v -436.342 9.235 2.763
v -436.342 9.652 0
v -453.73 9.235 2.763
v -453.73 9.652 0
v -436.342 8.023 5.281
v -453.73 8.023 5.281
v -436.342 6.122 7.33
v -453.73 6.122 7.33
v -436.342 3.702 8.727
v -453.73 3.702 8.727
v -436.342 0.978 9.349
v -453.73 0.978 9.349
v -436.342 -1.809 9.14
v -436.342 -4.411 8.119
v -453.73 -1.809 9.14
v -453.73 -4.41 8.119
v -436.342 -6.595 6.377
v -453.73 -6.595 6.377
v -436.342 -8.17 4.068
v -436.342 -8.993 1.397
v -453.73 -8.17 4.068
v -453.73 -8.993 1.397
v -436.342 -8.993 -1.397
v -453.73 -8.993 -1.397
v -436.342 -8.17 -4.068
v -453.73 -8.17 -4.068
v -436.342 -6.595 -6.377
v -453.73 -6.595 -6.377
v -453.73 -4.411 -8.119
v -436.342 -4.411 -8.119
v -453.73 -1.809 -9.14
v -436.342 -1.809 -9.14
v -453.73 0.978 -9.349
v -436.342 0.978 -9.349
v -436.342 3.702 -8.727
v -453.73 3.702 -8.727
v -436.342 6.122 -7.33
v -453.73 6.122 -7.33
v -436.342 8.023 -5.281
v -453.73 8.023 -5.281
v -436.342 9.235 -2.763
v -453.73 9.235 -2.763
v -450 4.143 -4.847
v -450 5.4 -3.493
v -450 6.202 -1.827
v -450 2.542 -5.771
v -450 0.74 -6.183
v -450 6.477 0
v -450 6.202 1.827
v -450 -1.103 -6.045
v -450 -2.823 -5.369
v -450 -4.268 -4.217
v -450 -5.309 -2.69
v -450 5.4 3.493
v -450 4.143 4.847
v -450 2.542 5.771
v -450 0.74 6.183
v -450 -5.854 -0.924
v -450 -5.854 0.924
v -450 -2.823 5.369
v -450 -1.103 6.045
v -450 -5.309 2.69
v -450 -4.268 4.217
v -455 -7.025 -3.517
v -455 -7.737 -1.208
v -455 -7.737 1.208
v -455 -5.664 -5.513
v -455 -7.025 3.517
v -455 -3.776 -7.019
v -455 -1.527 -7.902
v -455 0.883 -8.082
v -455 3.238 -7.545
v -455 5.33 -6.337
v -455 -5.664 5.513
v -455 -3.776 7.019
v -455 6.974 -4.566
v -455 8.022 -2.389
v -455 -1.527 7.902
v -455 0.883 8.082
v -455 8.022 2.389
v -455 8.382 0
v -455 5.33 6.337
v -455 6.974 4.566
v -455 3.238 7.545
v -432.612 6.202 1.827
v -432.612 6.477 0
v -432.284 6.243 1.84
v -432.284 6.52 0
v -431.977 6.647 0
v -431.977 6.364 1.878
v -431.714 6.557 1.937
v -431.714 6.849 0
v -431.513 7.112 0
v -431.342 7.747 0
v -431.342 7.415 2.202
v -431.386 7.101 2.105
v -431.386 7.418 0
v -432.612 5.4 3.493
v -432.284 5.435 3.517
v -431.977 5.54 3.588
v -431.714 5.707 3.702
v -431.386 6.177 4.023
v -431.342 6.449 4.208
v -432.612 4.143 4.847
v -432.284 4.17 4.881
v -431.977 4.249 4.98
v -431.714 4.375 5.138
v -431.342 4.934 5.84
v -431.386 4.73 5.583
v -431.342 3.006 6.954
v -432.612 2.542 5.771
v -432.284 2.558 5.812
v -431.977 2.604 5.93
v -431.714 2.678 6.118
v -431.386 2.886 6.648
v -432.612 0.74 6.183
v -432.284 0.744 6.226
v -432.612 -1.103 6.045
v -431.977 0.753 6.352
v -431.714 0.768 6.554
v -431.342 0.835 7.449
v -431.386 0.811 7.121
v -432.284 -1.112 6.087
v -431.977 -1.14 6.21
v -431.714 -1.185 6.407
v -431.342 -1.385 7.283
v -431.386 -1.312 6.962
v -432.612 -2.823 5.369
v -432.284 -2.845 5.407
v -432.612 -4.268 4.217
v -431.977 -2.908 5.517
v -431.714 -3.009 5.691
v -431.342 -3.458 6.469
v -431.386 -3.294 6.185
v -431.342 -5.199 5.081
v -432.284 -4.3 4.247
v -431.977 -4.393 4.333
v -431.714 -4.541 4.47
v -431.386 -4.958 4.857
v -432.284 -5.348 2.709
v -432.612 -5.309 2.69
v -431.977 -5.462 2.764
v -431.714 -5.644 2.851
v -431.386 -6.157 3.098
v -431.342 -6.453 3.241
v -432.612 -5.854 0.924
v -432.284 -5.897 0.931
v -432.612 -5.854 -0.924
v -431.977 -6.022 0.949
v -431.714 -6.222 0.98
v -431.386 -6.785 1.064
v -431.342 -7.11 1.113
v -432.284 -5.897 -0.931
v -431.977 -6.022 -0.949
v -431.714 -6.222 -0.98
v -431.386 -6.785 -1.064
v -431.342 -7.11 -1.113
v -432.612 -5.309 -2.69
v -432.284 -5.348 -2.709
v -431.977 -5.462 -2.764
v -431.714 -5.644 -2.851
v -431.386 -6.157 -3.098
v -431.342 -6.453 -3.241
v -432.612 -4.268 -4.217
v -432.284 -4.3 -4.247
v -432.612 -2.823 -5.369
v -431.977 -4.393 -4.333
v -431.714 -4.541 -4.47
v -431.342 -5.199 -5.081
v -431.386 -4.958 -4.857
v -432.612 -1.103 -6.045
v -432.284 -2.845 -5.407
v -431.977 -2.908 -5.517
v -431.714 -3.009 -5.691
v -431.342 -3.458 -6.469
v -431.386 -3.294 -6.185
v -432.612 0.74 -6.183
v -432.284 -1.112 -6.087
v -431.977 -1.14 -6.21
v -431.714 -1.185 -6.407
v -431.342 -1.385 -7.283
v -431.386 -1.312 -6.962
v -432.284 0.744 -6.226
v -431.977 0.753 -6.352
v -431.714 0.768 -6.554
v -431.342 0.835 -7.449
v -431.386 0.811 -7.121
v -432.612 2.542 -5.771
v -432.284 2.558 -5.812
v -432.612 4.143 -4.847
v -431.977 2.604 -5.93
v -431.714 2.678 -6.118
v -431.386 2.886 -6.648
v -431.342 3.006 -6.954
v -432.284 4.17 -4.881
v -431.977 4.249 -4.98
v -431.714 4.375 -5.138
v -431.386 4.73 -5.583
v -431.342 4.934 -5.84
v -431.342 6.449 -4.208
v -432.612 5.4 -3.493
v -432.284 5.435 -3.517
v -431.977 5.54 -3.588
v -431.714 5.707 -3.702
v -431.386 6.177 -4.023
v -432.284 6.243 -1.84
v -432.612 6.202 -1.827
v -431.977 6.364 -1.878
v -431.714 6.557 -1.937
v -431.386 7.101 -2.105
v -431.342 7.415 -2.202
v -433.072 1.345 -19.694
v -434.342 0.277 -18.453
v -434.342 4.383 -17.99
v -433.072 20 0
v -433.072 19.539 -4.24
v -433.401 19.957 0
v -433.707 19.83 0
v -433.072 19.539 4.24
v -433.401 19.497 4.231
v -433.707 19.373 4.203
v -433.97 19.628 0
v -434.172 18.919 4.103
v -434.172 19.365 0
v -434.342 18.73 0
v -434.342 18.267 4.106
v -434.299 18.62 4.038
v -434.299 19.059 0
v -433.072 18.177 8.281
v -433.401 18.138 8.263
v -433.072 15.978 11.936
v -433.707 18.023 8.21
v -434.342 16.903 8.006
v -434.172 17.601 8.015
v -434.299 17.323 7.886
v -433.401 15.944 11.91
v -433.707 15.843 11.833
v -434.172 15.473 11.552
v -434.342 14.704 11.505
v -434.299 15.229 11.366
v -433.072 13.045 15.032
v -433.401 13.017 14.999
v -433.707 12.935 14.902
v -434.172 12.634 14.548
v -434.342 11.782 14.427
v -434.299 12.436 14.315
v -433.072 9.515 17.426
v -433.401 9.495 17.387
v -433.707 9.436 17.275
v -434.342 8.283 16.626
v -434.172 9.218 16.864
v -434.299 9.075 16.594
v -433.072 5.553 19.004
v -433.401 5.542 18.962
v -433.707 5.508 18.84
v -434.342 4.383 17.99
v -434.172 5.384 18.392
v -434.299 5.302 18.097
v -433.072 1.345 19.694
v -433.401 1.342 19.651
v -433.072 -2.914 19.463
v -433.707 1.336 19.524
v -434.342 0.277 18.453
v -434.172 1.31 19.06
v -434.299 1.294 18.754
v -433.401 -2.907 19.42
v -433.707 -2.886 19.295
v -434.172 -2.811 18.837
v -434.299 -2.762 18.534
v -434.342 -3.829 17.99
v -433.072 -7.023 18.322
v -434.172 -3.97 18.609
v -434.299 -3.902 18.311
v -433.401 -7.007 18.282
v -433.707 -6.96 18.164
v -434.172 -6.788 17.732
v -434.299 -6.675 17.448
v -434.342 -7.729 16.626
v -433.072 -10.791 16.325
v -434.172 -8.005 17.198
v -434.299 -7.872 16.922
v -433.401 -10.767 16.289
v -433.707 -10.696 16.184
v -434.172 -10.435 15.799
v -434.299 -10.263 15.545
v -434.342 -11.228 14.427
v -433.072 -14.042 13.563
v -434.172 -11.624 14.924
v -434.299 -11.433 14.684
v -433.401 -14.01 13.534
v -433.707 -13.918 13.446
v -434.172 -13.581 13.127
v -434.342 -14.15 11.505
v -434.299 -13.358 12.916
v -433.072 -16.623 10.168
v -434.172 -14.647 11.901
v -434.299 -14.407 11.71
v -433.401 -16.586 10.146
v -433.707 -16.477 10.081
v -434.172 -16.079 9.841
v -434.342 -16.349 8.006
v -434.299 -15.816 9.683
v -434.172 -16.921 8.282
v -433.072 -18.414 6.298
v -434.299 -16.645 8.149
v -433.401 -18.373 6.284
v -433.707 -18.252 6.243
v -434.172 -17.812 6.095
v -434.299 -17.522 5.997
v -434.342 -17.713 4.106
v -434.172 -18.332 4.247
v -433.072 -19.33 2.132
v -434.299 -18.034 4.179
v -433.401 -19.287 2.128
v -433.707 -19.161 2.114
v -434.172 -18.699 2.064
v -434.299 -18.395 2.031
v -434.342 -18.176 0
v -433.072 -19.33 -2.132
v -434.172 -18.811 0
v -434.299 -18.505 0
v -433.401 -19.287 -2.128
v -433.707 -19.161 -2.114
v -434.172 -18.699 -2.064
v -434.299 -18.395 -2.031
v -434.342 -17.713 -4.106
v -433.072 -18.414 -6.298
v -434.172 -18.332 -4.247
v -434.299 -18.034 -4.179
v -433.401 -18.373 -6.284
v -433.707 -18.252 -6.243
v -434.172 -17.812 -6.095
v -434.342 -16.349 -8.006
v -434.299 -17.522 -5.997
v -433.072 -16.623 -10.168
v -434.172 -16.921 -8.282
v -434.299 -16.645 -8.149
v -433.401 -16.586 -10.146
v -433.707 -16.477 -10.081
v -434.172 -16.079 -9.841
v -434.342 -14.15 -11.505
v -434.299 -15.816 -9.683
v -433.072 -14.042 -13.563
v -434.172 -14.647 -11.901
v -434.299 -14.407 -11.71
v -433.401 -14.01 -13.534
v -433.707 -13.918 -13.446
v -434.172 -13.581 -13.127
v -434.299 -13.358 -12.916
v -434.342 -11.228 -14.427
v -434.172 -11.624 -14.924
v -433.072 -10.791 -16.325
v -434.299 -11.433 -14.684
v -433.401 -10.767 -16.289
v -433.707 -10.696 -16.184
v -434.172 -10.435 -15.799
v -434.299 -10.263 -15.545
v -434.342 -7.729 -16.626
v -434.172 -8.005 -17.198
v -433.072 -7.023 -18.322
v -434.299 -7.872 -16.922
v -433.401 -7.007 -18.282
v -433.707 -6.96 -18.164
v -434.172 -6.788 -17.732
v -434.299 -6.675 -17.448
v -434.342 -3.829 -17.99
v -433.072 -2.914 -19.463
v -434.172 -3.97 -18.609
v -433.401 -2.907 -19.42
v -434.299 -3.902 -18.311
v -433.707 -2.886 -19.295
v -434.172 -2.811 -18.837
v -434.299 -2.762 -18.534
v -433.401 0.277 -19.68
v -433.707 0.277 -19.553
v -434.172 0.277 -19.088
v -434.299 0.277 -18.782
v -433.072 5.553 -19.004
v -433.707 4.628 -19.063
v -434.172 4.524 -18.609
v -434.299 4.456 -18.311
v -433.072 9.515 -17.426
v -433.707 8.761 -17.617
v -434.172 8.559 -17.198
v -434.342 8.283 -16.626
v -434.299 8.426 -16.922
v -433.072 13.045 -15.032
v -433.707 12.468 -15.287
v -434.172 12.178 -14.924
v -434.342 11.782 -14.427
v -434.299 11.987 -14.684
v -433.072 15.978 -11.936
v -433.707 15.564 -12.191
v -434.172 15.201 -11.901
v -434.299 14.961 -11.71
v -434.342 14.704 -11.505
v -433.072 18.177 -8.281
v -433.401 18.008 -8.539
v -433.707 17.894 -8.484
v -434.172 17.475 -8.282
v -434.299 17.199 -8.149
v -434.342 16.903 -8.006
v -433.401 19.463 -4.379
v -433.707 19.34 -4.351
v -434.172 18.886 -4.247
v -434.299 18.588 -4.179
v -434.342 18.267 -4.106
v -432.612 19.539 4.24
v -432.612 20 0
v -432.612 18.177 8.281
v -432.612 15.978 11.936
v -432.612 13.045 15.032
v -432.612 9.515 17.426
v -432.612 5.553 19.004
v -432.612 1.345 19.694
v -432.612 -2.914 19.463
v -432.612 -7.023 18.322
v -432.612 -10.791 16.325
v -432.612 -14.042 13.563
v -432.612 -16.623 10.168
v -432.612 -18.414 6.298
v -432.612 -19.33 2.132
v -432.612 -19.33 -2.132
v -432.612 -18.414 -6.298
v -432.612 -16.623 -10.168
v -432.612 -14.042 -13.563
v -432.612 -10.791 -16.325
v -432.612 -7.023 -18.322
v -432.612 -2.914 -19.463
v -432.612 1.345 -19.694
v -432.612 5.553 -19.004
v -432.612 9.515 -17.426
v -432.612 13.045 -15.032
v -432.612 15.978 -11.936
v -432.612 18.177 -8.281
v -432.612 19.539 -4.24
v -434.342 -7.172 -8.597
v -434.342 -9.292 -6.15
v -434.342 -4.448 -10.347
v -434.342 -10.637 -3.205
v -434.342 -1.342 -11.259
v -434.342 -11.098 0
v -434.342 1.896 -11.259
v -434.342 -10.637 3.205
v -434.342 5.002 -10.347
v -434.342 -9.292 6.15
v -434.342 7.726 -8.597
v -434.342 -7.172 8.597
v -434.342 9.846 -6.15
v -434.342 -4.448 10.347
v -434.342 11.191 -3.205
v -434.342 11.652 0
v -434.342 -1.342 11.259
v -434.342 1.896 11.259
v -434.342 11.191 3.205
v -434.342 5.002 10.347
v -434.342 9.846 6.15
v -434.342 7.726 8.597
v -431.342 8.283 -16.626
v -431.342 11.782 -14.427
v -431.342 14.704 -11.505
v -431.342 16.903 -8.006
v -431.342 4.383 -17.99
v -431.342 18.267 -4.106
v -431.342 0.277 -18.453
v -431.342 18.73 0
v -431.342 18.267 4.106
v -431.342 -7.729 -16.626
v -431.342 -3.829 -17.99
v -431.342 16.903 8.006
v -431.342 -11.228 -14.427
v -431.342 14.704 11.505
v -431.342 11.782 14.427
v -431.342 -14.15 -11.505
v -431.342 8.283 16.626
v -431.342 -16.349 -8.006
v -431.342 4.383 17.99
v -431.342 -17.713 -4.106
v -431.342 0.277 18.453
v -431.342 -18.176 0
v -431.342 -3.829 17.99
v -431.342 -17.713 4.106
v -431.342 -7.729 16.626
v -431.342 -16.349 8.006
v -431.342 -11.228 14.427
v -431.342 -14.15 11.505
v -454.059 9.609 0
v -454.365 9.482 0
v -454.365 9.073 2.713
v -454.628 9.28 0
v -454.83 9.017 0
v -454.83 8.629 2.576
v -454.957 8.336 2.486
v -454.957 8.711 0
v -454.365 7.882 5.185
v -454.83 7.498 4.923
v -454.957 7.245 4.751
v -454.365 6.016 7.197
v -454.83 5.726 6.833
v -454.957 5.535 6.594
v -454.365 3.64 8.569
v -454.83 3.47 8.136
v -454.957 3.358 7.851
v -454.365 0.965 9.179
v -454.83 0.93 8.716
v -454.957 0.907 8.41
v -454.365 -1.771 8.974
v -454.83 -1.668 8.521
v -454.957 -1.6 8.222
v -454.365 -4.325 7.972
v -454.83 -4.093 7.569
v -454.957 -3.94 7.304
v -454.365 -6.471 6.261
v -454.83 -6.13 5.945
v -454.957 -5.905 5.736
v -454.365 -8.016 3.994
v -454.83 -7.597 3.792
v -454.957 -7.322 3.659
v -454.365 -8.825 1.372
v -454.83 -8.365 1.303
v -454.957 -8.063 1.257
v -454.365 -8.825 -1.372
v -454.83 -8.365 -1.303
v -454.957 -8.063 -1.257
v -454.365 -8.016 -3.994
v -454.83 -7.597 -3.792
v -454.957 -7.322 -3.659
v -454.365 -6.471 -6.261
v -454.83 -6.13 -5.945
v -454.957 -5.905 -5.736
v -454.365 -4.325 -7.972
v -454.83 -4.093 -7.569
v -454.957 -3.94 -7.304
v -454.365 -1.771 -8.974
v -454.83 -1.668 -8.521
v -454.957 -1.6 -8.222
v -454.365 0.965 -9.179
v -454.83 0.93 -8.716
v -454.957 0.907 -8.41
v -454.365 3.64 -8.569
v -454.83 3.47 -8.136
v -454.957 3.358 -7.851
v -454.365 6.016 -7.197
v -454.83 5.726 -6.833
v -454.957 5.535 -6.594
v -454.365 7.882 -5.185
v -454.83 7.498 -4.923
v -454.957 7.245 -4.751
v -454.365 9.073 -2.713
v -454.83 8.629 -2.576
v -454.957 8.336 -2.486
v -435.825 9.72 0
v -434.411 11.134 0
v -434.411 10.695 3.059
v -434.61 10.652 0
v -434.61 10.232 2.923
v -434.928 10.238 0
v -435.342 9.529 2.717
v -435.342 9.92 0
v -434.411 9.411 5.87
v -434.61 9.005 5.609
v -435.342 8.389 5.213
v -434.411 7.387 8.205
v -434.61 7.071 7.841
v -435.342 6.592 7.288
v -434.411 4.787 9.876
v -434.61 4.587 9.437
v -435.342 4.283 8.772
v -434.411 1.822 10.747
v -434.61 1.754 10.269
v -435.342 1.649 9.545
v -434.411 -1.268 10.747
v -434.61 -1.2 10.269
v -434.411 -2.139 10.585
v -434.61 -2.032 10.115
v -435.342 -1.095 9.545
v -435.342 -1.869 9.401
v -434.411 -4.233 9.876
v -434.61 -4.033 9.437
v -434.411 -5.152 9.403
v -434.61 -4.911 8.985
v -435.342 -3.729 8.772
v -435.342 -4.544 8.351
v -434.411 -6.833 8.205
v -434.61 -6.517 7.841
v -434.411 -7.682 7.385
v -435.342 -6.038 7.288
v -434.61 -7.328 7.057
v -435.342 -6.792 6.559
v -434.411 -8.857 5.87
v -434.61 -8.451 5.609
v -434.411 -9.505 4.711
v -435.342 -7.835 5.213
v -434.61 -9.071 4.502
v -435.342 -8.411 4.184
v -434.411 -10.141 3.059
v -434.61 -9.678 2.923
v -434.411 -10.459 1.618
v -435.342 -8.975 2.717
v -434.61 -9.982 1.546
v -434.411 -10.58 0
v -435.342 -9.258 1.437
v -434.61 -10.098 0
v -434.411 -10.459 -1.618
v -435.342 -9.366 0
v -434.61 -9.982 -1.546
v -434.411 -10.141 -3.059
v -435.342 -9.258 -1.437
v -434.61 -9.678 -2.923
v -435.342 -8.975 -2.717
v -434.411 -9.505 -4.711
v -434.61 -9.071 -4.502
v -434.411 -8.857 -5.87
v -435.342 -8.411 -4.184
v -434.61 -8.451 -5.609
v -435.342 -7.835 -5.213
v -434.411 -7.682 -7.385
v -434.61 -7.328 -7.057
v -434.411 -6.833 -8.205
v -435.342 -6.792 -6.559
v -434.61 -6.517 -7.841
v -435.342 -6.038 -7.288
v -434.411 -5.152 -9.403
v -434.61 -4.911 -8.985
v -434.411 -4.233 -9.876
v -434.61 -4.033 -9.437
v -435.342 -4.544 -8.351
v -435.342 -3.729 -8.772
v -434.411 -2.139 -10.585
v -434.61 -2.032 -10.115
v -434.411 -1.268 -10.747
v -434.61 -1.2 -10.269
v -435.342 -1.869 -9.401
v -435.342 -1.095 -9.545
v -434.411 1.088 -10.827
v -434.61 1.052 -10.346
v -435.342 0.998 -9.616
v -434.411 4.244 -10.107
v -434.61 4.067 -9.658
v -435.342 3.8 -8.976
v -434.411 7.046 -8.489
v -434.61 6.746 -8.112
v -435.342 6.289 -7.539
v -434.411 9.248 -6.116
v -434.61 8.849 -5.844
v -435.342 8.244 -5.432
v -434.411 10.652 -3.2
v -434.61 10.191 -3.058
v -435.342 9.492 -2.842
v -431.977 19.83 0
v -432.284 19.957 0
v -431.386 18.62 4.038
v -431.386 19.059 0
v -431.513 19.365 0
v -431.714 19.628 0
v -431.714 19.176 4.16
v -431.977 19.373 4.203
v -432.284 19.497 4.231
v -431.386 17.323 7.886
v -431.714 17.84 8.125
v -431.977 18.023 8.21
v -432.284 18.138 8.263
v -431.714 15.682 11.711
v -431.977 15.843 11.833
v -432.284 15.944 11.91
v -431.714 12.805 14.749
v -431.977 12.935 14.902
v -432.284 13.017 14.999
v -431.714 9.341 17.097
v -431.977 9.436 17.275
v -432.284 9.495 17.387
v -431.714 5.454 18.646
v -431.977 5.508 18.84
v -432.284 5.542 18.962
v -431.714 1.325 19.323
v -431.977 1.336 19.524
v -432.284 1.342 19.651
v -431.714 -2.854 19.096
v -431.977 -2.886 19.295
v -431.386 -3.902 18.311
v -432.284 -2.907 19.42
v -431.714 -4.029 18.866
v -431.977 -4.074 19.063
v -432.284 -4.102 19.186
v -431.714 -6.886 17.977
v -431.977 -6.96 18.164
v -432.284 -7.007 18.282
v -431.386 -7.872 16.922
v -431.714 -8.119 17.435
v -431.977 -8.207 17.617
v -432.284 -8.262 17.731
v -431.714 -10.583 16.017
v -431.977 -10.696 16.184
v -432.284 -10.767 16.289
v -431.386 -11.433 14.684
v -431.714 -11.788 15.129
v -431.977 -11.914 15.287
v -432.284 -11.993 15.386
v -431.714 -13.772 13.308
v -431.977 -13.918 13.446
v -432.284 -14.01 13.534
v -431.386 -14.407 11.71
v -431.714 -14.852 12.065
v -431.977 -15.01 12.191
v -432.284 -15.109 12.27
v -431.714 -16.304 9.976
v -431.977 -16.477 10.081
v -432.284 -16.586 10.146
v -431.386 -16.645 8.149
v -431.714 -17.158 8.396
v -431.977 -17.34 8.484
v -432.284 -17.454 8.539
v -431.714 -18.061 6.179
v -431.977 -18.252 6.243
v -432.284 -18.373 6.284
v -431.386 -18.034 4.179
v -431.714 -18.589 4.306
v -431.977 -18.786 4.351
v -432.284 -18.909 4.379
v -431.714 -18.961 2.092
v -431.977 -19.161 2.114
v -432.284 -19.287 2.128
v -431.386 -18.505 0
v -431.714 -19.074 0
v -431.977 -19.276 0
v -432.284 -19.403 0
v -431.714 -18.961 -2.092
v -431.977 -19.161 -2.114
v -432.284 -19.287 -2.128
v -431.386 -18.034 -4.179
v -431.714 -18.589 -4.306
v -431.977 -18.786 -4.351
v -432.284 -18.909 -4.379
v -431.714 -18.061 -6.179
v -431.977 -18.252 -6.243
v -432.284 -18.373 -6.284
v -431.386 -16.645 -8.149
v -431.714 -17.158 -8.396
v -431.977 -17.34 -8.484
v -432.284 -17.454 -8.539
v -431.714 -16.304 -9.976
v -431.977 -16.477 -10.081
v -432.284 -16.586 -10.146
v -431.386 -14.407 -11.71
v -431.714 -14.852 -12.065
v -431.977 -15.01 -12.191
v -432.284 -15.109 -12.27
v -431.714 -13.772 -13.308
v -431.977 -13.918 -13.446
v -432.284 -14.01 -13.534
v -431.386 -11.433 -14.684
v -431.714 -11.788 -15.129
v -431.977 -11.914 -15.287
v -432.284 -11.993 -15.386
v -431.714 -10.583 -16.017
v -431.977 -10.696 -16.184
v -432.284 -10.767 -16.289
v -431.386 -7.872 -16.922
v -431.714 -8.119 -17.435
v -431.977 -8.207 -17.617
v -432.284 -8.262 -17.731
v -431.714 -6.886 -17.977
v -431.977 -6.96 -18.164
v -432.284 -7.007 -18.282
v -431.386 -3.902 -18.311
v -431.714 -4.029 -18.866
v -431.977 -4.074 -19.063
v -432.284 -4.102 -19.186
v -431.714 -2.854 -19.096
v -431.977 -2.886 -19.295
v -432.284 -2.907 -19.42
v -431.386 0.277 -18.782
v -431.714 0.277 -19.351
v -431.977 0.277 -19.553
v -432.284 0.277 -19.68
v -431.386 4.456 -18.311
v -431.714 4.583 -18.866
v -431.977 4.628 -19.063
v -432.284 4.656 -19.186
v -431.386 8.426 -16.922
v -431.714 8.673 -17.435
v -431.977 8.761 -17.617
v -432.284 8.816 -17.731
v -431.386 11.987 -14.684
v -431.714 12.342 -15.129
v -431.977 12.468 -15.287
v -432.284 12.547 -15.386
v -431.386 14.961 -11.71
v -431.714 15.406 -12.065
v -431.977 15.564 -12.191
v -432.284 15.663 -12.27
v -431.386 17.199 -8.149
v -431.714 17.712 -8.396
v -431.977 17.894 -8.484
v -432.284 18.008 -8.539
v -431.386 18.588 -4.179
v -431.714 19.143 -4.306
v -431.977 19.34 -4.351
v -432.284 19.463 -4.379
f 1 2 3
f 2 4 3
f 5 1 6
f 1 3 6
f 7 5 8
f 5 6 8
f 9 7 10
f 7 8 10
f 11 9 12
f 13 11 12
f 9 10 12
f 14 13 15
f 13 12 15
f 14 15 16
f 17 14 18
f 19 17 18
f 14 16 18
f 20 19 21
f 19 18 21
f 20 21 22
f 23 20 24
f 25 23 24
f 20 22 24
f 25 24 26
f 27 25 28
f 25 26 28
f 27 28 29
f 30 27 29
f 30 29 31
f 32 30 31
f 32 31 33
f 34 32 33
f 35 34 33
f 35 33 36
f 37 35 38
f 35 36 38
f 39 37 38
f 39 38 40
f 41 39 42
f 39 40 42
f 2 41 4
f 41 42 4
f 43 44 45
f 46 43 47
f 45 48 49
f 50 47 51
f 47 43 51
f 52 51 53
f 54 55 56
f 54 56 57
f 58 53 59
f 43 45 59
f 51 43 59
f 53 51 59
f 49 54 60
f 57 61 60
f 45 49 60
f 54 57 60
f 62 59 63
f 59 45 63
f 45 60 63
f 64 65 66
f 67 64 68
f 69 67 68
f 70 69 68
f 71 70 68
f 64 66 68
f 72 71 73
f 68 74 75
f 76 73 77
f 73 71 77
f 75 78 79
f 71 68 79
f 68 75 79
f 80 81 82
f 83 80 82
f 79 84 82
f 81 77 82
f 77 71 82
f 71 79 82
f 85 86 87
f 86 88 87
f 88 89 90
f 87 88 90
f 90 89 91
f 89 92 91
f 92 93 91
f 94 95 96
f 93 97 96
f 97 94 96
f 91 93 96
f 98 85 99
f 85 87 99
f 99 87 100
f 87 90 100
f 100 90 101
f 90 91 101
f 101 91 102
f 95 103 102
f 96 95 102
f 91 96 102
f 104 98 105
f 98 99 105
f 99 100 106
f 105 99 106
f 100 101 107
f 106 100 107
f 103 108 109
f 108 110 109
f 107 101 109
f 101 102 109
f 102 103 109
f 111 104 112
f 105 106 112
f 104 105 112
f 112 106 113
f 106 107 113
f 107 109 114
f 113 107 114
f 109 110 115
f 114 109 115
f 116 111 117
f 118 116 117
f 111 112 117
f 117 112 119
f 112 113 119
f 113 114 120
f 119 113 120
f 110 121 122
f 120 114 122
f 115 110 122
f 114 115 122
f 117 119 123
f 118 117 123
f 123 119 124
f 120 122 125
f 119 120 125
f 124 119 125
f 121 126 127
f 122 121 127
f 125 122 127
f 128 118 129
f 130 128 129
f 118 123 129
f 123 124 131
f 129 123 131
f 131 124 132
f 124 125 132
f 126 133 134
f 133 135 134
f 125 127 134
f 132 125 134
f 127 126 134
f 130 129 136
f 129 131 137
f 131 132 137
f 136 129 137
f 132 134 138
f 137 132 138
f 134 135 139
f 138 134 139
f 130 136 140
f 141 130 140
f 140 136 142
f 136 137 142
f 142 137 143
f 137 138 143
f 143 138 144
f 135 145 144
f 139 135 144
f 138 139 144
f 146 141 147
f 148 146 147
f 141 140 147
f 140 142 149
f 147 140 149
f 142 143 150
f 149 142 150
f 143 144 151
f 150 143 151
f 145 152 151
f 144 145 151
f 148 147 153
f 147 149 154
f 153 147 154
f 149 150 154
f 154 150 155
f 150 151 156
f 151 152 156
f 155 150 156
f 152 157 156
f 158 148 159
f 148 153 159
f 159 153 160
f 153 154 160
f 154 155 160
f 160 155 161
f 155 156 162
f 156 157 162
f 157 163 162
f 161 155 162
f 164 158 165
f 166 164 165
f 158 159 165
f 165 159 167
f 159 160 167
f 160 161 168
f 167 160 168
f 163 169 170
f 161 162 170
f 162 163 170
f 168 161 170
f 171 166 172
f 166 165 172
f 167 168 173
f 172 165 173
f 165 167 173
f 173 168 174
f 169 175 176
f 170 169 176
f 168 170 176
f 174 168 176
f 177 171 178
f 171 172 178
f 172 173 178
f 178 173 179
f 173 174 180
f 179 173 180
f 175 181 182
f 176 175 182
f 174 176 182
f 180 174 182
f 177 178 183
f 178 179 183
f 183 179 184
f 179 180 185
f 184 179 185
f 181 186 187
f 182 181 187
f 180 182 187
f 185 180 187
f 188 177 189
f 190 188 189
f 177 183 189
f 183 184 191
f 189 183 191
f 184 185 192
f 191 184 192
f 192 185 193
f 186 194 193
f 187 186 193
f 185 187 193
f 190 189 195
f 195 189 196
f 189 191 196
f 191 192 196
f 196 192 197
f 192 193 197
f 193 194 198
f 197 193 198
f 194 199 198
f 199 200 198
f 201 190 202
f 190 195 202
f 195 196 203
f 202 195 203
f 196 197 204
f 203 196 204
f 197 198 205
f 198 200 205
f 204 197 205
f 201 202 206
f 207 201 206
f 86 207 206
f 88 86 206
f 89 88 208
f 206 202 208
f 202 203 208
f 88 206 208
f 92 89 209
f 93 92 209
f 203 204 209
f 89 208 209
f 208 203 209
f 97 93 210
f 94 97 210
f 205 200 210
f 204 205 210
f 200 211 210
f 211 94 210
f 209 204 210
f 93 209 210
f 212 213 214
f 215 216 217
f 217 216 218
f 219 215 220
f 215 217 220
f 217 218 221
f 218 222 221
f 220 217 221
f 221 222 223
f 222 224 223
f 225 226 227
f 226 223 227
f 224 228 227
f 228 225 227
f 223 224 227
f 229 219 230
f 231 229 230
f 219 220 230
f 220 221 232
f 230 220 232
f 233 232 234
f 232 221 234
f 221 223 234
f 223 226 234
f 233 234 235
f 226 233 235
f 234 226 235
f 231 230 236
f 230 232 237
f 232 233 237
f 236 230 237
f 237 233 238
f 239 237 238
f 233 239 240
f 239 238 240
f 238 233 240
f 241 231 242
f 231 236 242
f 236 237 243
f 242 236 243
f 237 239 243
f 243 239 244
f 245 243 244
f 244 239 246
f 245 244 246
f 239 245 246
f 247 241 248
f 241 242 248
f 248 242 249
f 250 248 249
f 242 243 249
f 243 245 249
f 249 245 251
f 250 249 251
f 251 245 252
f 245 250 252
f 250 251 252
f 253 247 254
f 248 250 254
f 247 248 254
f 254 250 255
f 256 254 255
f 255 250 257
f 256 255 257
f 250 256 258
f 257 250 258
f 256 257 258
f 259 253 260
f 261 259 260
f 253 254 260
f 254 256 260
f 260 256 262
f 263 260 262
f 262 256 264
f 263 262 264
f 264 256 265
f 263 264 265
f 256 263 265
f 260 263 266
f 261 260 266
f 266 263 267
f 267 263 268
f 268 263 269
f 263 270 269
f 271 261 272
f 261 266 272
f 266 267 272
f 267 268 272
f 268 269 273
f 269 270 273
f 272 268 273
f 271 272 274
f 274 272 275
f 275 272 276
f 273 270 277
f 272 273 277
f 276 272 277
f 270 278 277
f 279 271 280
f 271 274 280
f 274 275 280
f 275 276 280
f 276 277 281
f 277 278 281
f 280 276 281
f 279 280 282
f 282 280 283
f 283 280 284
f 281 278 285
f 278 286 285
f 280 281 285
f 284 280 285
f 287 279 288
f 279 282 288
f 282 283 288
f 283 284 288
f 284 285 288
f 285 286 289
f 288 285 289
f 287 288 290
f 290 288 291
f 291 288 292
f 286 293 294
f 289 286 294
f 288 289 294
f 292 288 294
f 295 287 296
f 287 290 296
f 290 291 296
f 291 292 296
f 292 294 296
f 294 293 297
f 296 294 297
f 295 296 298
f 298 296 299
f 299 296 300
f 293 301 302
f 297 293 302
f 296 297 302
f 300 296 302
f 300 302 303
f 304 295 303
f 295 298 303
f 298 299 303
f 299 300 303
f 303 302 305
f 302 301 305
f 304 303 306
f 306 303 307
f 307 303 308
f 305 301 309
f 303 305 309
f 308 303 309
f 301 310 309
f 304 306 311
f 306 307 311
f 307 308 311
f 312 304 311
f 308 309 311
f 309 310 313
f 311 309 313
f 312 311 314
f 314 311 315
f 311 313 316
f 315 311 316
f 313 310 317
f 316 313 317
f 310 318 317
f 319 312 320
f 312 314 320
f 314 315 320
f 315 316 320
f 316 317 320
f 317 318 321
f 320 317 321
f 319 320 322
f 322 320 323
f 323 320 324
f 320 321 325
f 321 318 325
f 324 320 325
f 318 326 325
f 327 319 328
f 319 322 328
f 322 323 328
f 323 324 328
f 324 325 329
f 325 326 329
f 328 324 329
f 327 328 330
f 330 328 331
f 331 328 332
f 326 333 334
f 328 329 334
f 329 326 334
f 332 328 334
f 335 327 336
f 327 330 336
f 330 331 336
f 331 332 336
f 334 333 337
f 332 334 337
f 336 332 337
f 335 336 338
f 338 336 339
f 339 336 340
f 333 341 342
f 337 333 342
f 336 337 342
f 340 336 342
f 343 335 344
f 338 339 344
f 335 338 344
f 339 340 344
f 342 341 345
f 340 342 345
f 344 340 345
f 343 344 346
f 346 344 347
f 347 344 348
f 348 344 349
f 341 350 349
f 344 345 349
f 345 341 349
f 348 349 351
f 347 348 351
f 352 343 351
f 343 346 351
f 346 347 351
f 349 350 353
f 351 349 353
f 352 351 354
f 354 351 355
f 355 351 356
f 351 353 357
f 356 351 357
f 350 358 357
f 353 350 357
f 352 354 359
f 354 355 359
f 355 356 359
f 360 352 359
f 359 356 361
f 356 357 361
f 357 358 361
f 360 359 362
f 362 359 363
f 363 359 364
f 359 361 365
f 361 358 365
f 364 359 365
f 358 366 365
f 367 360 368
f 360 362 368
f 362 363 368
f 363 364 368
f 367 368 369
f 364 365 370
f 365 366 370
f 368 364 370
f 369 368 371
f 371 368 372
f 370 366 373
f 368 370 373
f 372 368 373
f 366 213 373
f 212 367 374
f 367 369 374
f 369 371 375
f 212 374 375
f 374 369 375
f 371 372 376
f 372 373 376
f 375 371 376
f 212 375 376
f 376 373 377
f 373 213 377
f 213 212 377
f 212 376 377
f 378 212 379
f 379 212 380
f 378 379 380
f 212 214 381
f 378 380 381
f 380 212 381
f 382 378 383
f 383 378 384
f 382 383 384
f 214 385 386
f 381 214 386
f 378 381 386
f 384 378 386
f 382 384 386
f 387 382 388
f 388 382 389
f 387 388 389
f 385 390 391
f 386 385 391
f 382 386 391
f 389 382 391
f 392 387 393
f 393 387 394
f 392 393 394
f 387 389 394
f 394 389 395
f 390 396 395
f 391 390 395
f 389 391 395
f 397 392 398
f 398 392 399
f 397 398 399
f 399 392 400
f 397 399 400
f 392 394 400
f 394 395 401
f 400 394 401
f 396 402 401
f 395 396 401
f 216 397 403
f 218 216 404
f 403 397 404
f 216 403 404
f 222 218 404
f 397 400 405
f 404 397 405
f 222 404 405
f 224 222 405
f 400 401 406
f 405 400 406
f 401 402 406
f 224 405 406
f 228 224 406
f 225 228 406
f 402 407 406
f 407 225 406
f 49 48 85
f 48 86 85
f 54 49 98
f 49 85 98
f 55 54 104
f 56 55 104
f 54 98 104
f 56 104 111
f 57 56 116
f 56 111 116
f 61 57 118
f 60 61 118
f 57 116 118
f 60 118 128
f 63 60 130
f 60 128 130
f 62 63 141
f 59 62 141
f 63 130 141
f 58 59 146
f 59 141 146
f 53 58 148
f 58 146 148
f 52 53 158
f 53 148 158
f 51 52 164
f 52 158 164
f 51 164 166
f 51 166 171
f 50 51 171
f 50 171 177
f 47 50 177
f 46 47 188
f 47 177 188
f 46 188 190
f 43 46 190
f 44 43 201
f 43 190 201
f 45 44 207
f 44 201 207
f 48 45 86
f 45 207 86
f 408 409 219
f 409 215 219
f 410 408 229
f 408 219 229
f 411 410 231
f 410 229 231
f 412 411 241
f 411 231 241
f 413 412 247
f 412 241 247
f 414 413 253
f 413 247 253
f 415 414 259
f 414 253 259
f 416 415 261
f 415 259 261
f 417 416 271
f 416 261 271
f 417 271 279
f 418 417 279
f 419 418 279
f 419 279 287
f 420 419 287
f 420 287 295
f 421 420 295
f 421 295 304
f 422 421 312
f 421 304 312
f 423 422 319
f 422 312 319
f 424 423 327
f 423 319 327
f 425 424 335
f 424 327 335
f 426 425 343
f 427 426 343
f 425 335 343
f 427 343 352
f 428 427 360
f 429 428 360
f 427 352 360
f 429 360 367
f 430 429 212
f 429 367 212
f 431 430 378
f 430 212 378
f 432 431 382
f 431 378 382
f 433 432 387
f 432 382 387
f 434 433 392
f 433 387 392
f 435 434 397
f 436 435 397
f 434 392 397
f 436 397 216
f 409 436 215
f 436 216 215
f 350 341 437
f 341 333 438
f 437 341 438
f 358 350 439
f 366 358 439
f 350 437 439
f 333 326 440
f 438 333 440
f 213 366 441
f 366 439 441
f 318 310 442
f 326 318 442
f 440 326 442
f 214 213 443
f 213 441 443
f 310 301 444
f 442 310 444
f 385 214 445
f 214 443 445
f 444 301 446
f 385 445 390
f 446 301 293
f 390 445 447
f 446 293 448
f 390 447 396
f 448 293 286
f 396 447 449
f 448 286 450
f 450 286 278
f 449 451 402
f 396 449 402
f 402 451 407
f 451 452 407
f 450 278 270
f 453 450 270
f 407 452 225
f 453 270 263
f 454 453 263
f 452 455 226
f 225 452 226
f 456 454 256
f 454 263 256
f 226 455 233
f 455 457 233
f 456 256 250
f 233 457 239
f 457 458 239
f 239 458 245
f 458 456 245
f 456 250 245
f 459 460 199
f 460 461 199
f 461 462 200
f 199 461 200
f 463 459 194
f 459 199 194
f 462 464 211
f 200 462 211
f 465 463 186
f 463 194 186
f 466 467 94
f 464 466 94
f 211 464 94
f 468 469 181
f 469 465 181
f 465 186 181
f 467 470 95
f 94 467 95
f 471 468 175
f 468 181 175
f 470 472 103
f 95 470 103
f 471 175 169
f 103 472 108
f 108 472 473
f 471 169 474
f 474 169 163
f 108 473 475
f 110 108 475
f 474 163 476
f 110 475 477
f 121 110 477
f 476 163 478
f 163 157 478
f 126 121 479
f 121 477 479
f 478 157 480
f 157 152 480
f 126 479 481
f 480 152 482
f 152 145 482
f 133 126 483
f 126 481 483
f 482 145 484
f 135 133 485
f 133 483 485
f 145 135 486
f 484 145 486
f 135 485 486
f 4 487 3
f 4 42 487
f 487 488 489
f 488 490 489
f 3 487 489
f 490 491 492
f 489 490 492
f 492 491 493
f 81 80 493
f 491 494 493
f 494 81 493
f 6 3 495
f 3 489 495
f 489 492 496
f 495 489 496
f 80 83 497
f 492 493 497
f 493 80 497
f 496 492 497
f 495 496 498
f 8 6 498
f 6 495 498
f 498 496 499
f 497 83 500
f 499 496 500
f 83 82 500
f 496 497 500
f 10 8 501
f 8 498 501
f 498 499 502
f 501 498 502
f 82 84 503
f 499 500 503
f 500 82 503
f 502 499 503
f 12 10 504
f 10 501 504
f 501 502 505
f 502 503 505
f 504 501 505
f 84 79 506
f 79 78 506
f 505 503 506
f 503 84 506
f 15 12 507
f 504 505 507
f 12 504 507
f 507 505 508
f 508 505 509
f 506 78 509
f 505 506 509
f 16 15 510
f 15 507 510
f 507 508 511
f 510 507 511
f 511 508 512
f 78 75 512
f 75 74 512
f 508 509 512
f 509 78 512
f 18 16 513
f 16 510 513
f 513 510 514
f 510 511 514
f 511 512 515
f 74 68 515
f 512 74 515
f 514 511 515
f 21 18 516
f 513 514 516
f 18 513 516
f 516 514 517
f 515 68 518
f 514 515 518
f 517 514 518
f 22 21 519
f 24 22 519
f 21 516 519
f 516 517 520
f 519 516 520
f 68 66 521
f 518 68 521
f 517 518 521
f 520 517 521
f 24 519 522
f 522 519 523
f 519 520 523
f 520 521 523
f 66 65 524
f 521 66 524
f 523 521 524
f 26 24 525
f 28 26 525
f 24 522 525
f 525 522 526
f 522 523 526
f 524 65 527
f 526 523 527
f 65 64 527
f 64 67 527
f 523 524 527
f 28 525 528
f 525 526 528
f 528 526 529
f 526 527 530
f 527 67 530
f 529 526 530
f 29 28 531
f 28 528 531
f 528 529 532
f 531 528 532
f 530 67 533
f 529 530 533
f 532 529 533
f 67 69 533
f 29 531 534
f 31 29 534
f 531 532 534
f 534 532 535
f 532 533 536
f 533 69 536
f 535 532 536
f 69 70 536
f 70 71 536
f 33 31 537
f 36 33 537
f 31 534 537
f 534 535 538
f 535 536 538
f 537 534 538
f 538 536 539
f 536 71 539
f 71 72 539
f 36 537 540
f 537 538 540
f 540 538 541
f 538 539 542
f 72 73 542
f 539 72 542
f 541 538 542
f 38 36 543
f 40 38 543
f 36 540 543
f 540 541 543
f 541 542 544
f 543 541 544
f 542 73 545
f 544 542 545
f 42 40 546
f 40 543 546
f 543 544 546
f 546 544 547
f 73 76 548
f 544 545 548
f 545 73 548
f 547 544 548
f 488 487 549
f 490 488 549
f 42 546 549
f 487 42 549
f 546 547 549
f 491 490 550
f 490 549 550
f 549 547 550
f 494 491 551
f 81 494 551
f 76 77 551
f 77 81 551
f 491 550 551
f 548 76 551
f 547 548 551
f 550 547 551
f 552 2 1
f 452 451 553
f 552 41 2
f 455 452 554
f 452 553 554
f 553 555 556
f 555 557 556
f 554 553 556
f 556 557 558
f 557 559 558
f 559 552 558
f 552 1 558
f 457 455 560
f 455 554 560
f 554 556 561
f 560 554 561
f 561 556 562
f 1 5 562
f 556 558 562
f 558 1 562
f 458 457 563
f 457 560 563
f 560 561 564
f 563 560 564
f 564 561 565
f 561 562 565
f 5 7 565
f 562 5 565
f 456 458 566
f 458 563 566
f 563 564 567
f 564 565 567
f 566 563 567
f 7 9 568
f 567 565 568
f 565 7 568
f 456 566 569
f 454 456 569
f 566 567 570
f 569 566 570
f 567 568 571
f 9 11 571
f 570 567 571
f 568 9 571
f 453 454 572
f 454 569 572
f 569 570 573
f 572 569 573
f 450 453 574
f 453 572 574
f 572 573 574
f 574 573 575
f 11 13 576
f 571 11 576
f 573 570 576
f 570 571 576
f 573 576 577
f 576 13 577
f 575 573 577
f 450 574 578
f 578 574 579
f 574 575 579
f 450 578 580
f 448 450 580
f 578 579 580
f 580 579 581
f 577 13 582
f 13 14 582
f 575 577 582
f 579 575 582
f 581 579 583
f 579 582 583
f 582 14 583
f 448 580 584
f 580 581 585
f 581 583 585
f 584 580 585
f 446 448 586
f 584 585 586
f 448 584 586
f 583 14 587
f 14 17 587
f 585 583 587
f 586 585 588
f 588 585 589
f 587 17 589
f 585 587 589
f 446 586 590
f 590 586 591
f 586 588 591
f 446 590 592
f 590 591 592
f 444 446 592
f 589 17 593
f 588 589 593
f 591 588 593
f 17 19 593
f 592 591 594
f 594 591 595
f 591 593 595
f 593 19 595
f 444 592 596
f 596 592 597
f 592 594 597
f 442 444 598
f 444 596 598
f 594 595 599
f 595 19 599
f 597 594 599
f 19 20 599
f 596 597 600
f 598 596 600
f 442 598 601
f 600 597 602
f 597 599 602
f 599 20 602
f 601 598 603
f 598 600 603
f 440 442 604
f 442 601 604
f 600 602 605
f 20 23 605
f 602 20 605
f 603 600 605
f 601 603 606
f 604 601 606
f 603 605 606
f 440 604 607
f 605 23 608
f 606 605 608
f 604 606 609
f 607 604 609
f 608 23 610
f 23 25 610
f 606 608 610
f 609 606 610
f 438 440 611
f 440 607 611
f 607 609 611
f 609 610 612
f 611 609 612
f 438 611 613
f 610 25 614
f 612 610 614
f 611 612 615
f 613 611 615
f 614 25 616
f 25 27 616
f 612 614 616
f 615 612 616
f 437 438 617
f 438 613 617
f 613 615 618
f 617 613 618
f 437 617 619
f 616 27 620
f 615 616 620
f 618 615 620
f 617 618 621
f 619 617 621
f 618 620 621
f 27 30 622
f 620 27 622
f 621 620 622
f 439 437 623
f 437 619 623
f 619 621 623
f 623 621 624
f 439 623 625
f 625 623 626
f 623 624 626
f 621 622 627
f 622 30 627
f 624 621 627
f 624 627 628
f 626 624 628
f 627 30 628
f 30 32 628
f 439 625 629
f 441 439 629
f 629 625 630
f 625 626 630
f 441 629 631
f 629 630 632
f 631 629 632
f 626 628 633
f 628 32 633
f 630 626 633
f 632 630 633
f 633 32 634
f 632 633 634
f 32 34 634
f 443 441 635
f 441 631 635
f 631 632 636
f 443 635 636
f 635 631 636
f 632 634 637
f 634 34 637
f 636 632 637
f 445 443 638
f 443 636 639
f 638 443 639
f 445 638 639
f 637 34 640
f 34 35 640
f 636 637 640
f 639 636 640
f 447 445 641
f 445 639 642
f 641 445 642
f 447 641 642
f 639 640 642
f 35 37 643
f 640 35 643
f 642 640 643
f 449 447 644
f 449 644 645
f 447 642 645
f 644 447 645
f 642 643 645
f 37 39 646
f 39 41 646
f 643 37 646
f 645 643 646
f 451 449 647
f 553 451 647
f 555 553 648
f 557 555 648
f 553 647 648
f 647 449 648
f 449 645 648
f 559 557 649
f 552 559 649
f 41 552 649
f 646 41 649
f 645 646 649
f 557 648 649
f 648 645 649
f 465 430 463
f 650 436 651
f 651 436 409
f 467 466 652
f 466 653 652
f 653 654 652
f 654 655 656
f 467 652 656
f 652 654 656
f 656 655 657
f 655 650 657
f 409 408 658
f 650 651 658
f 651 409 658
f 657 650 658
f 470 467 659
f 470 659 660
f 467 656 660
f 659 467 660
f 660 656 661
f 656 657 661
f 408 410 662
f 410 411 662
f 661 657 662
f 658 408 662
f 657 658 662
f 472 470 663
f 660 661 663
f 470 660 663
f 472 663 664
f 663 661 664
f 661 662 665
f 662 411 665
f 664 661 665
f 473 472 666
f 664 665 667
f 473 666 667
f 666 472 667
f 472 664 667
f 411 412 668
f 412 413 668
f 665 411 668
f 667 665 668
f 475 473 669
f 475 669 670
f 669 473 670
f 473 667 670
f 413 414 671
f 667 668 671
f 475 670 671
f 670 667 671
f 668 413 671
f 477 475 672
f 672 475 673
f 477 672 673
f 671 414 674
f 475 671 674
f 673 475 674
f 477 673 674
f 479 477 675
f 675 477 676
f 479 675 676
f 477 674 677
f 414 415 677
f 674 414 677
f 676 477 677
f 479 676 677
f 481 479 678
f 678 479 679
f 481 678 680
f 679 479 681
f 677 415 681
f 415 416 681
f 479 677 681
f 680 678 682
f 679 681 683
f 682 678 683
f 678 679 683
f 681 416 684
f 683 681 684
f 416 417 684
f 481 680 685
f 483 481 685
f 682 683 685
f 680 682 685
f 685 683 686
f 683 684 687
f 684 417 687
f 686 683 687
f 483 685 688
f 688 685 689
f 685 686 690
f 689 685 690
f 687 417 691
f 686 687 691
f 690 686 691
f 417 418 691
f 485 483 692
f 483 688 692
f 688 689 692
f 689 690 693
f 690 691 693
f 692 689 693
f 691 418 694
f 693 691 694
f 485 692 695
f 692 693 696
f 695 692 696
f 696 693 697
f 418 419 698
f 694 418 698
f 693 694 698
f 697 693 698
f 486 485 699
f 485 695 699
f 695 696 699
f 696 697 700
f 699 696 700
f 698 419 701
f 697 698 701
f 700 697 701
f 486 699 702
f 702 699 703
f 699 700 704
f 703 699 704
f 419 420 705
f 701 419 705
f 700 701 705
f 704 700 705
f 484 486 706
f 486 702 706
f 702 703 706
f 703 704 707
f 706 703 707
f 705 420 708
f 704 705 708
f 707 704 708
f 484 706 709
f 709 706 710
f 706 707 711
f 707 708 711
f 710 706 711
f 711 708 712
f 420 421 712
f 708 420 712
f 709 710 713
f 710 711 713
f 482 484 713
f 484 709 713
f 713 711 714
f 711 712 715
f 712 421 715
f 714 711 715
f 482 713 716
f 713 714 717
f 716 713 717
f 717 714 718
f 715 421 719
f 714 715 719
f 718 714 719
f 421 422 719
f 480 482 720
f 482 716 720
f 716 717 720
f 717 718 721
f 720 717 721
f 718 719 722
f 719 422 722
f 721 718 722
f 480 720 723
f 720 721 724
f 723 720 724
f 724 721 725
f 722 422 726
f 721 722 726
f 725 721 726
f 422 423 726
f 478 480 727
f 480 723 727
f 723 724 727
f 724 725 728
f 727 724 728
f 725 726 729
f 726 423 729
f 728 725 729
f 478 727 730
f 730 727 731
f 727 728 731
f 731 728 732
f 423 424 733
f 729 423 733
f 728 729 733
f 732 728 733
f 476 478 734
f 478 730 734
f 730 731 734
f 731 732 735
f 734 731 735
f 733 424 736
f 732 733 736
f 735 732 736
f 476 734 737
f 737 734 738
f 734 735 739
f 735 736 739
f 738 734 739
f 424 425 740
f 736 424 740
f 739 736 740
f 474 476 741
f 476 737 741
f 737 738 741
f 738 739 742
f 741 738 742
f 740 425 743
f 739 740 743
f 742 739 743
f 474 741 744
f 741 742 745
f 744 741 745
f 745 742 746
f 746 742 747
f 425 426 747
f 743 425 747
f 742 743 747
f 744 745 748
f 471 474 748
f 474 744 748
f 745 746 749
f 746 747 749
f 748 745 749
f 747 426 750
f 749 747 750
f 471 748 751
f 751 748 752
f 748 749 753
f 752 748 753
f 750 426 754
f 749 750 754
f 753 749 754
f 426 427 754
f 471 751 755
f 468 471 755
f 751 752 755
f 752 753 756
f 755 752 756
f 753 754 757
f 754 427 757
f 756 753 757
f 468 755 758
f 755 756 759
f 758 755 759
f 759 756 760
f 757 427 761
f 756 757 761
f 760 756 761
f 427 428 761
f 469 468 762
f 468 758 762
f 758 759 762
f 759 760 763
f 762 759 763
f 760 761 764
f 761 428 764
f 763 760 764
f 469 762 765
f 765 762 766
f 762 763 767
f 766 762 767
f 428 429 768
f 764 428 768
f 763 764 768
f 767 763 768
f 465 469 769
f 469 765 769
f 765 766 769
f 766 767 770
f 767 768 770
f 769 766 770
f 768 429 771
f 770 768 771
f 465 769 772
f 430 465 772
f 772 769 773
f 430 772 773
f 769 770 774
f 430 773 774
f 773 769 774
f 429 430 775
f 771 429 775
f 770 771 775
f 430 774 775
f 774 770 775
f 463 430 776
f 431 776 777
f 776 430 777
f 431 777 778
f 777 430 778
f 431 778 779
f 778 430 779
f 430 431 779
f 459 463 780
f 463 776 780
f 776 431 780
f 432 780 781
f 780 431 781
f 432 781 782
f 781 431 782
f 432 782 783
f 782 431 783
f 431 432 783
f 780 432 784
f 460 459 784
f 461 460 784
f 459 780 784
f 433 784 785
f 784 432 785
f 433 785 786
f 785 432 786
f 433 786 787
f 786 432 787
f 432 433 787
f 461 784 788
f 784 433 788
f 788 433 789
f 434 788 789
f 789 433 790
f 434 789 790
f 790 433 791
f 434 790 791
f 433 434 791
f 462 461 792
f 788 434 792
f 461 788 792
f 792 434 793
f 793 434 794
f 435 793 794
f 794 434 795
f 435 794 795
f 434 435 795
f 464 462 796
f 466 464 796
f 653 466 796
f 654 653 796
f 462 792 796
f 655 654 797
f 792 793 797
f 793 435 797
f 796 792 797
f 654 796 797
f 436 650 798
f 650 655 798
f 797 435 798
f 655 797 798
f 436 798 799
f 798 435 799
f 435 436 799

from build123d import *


with BuildPart() as part:
    # 草图1 → 旋转1 (revolve)
    with BuildSketch(Plane.XY):
        with BuildLine():
            Line((-455, 8.382), (-455, 0.277))
            Line((-455, 0.277), (-450, 0.277))
            Line((-450, 0.277), (-450, 6.477))
            Line((-450, 6.477), (-432.612413979, 6.477))
            ThreePointArc((-432.612413979, 6.477), (-431.714388367, 6.848974388), (-431.342413979, 7.747))
            Line((-431.342413979, 7.747), (-431.342413979, 18.73))
            ThreePointArc((-431.342413979, 18.73), (-431.714388367, 19.628025612), (-432.612413979, 20))
            Line((-432.612413979, 20), (-433.072413979, 20))
            ThreePointArc((-433.072413979, 20), (-433.970439591, 19.628025612), (-434.342413979, 18.73))
            Line((-434.342413979, 18.73), (-434.342413979, 11.652))
            ThreePointArc((-434.342413979, 11.652), (-434.928200417, 10.237786438), (-436.342413979, 9.652))
            Line((-436.342413979, 9.652), (-453.73, 9.652))
            ThreePointArc((-453.73, 9.652), (-454.628025612, 9.280025612), (-455, 8.382))
        make_face()
    revolve(axis=Axis((-455.001250002, 0.277, 0), (1, 0, 0)))


solid = part.part
